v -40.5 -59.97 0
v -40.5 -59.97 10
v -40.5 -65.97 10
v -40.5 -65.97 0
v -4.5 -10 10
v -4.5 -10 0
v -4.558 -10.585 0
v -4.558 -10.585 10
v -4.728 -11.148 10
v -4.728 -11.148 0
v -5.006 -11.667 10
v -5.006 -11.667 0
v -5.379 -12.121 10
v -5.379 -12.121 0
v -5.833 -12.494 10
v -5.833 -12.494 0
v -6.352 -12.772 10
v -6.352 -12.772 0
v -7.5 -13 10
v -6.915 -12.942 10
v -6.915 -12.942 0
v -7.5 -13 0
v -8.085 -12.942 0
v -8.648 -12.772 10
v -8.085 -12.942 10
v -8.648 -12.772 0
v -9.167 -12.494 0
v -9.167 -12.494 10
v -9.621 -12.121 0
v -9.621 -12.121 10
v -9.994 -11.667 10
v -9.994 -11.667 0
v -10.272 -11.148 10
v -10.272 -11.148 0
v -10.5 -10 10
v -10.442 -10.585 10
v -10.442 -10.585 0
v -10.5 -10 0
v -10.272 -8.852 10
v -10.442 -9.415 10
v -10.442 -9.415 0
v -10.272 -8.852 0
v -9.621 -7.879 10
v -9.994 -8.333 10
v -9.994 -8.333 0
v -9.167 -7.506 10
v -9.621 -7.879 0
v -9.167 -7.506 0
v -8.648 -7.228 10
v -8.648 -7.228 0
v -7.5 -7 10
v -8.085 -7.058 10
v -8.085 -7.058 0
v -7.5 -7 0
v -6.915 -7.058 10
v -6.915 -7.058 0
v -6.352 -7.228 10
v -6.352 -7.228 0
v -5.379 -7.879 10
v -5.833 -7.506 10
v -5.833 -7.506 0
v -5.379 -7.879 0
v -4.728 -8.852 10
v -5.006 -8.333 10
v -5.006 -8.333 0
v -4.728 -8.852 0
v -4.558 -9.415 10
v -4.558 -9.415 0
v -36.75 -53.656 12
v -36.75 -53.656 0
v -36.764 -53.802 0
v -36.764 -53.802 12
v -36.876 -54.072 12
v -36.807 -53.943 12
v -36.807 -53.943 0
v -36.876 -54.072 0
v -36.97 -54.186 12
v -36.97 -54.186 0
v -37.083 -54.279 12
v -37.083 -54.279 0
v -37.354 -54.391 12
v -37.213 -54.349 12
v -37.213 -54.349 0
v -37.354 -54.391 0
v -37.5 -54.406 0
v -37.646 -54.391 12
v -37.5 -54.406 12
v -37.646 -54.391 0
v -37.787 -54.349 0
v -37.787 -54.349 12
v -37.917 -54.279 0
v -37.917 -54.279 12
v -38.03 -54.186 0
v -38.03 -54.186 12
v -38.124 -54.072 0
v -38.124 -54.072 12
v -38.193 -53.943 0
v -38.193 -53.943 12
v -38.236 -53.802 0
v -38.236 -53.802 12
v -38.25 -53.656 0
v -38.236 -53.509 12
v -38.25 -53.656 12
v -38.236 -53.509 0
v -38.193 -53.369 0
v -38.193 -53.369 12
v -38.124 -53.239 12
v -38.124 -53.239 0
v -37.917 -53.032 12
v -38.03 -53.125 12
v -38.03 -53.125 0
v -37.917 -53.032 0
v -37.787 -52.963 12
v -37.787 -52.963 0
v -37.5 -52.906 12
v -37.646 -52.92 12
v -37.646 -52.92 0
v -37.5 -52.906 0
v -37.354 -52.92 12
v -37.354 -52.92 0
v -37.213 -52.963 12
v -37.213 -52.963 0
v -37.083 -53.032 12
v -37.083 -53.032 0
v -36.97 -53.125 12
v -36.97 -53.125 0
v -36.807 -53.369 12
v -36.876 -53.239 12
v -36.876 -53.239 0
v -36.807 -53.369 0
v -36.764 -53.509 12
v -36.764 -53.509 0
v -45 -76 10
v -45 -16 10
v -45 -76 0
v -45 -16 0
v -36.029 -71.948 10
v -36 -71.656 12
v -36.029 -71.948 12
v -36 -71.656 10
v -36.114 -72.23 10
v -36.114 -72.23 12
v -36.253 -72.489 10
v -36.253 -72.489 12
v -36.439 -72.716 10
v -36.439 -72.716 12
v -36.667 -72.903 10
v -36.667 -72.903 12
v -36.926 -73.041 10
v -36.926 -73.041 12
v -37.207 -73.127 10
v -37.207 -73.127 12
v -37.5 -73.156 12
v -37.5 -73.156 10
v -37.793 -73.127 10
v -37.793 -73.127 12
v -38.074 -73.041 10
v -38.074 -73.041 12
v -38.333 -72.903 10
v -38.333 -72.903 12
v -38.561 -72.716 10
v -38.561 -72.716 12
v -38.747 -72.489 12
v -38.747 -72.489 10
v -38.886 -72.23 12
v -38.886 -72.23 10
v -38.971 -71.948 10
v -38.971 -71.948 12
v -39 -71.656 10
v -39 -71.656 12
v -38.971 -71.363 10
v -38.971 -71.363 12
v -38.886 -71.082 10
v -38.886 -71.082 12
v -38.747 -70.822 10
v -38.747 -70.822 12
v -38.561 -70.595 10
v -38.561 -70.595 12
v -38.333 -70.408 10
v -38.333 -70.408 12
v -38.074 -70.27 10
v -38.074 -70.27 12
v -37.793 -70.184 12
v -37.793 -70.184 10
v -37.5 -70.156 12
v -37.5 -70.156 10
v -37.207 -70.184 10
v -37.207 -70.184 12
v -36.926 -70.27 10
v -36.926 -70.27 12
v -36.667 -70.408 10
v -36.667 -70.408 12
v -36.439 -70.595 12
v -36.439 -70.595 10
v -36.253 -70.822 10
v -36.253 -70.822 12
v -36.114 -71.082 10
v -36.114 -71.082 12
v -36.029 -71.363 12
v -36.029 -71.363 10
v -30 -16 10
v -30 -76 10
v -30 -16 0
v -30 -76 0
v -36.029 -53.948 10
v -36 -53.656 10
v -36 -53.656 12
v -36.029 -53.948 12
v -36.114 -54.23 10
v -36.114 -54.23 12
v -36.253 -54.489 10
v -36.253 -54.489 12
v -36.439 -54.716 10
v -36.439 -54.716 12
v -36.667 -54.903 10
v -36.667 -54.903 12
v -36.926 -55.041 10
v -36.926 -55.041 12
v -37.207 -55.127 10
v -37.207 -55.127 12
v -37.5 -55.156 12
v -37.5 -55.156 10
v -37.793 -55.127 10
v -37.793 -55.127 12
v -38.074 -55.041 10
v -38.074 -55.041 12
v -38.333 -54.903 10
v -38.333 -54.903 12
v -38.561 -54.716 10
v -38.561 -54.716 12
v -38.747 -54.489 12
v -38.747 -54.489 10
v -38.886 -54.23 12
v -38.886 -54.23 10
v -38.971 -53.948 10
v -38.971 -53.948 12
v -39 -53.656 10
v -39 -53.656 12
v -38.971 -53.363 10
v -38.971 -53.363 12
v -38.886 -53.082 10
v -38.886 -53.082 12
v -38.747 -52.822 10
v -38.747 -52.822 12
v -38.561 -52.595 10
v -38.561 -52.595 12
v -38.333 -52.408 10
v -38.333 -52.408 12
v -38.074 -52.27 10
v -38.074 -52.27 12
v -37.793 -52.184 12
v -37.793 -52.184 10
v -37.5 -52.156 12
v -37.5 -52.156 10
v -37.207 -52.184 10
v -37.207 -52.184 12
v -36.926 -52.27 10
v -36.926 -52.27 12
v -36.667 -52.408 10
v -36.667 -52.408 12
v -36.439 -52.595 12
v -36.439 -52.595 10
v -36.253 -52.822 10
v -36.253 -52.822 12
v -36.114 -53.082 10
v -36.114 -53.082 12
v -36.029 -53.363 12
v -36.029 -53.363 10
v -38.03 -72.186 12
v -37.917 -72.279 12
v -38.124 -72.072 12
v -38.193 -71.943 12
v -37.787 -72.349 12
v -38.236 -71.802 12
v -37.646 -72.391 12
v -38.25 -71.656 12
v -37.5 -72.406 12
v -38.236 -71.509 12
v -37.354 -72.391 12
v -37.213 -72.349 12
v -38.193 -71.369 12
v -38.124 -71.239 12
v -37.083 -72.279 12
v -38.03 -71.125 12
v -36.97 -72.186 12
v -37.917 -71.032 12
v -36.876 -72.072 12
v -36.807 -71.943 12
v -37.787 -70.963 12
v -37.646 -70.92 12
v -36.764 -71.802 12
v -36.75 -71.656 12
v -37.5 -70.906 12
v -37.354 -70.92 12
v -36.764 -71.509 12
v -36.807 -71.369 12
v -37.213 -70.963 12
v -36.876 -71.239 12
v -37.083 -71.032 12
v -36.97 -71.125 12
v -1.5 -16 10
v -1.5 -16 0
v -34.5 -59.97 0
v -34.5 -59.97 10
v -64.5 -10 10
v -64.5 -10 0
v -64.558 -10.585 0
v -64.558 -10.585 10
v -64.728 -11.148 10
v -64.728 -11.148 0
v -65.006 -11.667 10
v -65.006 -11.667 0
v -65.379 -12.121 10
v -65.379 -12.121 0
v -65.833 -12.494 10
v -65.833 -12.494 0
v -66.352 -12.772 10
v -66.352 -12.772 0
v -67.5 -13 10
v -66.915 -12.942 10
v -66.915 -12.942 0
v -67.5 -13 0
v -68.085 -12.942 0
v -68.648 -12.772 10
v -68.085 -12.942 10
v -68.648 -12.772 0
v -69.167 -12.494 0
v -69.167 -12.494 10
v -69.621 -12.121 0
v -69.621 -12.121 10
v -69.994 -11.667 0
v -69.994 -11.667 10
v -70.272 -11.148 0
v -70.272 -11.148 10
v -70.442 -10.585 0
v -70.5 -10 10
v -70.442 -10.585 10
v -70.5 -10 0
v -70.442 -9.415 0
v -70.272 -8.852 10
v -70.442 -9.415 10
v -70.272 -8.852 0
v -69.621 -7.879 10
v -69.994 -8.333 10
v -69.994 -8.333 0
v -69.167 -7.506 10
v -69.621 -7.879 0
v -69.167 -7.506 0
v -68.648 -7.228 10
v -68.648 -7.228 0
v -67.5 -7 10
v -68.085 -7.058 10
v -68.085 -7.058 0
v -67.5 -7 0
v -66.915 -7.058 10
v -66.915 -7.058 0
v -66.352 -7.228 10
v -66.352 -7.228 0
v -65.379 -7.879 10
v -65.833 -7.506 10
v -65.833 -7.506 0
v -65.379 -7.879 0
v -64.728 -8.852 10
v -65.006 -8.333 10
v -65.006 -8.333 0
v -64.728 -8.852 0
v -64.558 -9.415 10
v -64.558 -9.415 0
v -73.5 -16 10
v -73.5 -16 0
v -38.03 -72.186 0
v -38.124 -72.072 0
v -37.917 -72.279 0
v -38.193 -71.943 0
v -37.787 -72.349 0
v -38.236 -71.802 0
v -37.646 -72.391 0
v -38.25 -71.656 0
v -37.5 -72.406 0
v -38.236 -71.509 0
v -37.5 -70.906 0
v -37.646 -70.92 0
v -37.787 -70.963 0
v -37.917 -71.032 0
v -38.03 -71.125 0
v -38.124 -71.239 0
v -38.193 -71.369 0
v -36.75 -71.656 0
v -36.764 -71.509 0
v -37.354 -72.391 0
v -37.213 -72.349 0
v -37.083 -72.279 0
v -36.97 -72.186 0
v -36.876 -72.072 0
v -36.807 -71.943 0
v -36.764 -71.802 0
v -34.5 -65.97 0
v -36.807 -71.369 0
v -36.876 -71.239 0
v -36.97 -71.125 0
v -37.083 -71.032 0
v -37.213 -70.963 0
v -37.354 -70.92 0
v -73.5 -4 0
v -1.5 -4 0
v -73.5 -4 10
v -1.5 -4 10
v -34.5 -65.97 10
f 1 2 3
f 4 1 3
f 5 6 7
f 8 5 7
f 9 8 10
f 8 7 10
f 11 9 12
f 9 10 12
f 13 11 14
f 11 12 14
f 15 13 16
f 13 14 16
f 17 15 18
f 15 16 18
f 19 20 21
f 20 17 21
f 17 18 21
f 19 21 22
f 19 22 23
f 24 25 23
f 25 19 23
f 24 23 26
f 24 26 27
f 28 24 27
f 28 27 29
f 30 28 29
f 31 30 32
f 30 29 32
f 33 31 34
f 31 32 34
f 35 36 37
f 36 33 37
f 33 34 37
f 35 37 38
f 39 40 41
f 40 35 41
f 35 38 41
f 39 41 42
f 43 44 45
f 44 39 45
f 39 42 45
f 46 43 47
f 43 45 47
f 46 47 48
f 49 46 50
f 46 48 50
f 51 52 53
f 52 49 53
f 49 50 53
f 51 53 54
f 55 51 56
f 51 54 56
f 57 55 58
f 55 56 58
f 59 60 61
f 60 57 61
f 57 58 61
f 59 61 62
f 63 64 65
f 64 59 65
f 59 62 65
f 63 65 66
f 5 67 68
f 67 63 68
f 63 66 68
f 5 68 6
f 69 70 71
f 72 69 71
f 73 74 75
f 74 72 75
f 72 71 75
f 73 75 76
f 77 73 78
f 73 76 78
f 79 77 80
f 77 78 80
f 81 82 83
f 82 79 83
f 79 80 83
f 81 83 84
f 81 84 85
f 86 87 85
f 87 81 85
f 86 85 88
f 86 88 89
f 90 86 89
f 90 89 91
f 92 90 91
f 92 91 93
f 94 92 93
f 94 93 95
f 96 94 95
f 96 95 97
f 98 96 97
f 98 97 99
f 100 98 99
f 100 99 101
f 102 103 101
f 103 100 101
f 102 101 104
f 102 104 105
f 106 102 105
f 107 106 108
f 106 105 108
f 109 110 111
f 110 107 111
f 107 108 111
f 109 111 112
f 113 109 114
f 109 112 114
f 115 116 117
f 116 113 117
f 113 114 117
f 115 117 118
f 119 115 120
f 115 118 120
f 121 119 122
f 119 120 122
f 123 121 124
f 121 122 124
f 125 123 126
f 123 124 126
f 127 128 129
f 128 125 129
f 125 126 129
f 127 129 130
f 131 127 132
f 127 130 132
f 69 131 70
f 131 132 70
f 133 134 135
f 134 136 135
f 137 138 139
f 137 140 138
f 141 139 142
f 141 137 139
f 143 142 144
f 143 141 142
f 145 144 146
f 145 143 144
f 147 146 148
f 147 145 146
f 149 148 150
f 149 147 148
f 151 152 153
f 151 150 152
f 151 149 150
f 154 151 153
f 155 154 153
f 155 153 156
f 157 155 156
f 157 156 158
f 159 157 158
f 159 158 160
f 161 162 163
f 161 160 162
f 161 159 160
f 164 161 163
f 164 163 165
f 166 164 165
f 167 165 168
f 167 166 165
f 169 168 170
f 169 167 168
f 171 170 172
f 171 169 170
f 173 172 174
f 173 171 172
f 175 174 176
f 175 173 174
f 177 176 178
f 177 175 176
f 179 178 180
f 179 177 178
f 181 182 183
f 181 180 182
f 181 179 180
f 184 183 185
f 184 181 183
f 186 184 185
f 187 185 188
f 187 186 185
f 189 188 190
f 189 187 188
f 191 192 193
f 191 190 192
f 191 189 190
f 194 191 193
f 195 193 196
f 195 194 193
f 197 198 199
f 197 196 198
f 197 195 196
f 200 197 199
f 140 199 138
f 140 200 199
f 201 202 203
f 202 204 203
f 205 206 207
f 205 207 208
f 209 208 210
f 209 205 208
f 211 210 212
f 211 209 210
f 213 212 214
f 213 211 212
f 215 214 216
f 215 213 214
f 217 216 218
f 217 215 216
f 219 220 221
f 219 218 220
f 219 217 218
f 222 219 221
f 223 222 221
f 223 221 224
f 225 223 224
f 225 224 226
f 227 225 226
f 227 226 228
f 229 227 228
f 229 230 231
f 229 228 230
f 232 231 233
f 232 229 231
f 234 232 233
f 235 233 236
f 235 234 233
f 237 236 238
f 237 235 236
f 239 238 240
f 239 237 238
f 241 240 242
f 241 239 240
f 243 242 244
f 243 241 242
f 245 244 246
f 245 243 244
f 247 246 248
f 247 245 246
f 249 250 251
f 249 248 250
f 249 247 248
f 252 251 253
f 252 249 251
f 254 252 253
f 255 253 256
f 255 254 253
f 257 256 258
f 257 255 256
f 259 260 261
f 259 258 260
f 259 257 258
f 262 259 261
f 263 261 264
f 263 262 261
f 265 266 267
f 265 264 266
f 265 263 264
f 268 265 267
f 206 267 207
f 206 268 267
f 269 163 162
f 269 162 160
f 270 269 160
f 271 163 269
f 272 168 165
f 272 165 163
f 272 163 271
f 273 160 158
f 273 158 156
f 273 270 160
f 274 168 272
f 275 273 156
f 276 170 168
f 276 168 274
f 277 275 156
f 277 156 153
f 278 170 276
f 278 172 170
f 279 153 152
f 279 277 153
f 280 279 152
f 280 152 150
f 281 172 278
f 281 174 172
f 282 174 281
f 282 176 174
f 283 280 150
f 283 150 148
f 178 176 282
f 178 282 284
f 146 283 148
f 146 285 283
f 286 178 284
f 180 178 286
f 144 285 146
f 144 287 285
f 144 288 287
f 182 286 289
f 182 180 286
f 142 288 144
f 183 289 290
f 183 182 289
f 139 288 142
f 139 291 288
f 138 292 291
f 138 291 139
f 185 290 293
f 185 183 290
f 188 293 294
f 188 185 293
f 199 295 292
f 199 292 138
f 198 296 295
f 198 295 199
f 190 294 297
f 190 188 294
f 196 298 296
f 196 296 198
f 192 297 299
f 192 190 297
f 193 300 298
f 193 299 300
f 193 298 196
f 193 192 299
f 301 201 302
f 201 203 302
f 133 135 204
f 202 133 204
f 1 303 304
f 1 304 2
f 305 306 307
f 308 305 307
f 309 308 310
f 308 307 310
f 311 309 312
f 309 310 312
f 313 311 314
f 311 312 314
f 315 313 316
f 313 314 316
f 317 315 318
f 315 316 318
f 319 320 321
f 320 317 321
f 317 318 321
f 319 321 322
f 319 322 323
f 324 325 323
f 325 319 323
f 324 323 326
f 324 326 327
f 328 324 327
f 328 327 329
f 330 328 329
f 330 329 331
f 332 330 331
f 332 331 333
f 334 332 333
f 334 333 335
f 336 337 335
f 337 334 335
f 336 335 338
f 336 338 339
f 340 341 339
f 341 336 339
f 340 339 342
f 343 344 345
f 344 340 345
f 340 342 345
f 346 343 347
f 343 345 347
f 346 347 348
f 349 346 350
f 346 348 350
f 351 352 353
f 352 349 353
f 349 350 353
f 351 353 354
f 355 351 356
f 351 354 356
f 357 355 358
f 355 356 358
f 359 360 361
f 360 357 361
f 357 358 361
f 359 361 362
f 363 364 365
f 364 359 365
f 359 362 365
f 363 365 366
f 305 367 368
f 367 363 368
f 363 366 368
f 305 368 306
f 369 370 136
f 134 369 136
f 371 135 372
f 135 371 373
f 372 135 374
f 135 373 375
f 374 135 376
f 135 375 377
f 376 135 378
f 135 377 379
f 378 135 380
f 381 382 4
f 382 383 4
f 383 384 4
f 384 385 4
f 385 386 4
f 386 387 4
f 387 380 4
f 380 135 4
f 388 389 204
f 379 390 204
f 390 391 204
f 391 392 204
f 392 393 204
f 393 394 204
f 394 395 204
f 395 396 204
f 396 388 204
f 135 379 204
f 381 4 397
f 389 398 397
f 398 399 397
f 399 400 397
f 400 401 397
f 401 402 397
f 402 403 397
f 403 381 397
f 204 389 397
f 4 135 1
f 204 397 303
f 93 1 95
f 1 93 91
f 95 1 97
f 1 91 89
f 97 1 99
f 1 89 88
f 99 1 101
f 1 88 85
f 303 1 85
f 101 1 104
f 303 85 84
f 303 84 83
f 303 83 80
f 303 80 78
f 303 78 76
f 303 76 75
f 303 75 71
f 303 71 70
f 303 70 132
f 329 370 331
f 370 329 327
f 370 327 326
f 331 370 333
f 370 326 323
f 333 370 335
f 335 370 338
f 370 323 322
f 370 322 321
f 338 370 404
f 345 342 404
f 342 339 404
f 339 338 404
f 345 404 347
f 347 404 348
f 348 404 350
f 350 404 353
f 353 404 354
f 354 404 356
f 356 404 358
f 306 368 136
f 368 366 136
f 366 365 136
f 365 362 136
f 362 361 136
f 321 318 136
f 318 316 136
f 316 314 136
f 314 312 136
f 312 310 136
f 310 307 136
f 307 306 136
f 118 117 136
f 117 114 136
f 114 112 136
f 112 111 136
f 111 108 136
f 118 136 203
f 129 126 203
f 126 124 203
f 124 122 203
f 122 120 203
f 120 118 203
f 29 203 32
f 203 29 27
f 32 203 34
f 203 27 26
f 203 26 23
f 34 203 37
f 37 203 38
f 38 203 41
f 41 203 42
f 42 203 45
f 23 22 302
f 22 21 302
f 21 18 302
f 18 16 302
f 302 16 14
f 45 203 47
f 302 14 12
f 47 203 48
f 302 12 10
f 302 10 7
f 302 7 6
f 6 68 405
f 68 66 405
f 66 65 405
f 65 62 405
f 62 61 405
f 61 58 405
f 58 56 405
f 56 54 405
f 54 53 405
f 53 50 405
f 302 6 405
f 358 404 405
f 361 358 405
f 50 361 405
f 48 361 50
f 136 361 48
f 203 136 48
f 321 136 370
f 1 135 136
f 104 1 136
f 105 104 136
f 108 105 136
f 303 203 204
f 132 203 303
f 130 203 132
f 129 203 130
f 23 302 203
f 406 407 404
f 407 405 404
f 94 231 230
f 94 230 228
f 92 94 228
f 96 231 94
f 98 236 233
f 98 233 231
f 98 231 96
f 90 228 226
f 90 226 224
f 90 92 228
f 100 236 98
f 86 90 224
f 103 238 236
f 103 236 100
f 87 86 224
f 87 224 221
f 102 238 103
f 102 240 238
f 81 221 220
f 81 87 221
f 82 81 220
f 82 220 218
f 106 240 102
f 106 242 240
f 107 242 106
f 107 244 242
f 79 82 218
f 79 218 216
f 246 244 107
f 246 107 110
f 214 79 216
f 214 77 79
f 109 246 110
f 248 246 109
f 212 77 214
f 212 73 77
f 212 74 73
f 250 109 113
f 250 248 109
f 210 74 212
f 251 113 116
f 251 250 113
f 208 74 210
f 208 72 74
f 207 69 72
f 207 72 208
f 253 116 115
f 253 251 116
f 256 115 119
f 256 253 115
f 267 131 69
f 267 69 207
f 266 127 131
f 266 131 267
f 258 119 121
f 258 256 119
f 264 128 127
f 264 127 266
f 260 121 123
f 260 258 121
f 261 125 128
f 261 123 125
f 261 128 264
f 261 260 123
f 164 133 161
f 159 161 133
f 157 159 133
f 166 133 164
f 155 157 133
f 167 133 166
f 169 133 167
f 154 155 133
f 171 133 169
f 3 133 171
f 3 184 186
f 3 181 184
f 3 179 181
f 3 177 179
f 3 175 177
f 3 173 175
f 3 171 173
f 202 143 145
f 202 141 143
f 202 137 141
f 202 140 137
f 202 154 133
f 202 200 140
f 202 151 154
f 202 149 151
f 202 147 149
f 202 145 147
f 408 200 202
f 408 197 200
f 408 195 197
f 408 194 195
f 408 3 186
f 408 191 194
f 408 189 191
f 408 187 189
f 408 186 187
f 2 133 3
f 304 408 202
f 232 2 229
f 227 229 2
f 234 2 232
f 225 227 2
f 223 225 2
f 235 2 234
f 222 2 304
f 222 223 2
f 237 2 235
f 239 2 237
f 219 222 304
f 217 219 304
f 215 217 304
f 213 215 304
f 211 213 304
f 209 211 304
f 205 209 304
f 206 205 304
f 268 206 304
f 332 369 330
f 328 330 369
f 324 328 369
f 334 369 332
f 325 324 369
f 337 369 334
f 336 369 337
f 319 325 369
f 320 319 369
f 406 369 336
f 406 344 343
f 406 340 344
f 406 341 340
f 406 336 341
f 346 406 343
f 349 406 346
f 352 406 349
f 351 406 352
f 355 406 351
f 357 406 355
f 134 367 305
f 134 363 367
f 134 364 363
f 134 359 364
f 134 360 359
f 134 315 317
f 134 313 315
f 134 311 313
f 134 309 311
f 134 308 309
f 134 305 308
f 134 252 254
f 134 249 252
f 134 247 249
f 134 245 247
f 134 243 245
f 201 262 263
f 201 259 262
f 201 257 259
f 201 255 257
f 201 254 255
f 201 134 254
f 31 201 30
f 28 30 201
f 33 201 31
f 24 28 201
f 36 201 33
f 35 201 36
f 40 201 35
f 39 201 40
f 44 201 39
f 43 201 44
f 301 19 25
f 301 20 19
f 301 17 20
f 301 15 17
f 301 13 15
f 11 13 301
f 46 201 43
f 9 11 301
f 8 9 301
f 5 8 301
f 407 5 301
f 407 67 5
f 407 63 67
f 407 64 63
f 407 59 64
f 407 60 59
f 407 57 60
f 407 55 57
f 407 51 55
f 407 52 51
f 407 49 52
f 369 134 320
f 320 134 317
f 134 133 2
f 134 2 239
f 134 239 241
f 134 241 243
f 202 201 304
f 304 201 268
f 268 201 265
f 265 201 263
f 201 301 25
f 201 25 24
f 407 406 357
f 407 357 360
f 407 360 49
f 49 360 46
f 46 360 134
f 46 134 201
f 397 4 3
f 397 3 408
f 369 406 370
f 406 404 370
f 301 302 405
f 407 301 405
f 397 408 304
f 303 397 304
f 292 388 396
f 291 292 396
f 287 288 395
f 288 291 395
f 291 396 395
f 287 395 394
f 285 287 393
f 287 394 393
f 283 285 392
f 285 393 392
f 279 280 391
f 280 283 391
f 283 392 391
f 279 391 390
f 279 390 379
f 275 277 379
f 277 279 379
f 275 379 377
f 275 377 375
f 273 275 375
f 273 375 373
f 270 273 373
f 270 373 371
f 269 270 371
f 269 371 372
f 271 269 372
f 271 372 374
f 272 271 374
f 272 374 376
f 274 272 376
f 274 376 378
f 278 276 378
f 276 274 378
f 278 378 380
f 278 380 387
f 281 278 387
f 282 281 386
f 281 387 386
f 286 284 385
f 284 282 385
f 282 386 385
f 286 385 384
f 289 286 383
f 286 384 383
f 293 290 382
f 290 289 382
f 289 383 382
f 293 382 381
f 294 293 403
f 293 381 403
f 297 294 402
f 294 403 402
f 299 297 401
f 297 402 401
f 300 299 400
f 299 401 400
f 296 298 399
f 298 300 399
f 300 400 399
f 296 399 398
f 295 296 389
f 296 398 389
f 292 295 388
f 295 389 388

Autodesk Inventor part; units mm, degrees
ref_plane "YZ Plane" through (0, 0, 0) normal (1, 0, 0) x (0, 1, 0)
ref_plane "XZ Plane" through (0, 0, 0) normal (0, 1, 0) x (-1, 0, 0)
ref_plane "XY Plane" through (0, 0, 0) normal (0, 0, 1) x (1, 0, 0)
ref_plane "Płaszczyzna konstrukcyjna1" through (0, -20, 0) normal (0, 0, 1) x (1, 0, 0)
sketch "Szkic1" plane through (0, -20, 0) normal (0, 0, 1) x (1, 0, 0)
  line L0 (-14.5, -19.3841) -> (-60.5, -19.3841) construction
  line L1 (-14.5, -66.5556) -> (-14.5, -19.3841) projected
  line L2 (-60.5, -66.5556) -> (-14.5, -66.5556) projected
  line L3 (-60.5, -19.3841) -> (-60.5, -66.5556) projected
  line L4 (-62.5, -67.9698) -> (-62.5, -17.9698) projected
  line L5 (-12.5, -67.9698) -> (-62.5, -67.9698) projected
  line L6 (-12.5, -17.9698) -> (-12.5, -67.9698) projected
  line L7 (-62.5, -17.9698) -> (-12.5, -17.9698) construction
  circle A0 centre (-7.5, 10) radius 3 projected
  circle A1 centre (-67.5, 10) radius 3 projected
  line L8 (-75, 0) -> (0, 0) construction
  line L9 (0, 20) -> (0, 0) projected
  line L10 (-75, 20) -> (0, 20) projected
  line L11 (-75, 20) -> (-75, 0) projected
  line L12 (-14.5, -19.3841) -> (-60.5, -66.5556) construction
  line L13 (-60.5, -19.3841) -> (-14.5, -66.5556) construction
  line L14 (-1.5, 16) -> (-73.5, 16)
  line L15 (-73.5, 16) -> (-73.5, 4)
  line L16 (-1.5, 4) -> (-1.5, 16)
  line L17 (-27.5, -27.9698) -> (-47.5, -27.9698) construction
  line L18 (-47.5, -27.9698) -> (-47.5, -57.9698) construction
  line L19 (-47.5, -57.9698) -> (-27.5, -57.9698) construction
  line L20 (-27.5, -57.9698) -> (-27.5, -27.9698) construction
  line L21 (-27.5, -27.9698) -> (-47.5, -57.9698) construction
  line L22 (-47.5, -27.9698) -> (-27.5, -57.9698) construction
  line L23 (-37.5, -27.9698) -> (-37.5, -57.9698) construction
  circle A2 centre (-37.5, -33.6556) radius 0.75
  circle A3 centre (-37.5, -51.6556) radius 0.75
  circle A4 centre (-37.5, -33.6556) radius 1.5
  circle A5 centre (-37.5, -51.6556) radius 1.5
  line L24 (-45, 4) -> (-45, -56)
  line L25 (-45, -56) -> (-30, -56)
  line L26 (-30, -56) -> (-30, 4)
  line L27 (-34.5, -39.9698) -> (-40.5, -39.9698)
  line L28 (-40.5, -39.9698) -> (-40.5, -45.9698)
  line L29 (-40.5, -45.9698) -> (-34.5, -45.9698)
  line L30 (-34.5, -45.9698) -> (-34.5, -39.9698)
  line L31 (-34.5, -39.9698) -> (-40.5, -45.9698) construction
  line L32 (-40.5, -39.9698) -> (-34.5, -45.9698) construction
  line L33 (-73.5, 4) -> (-45, 4)
  line L34 (-30, 4) -> (-1.5, 4)
  line L35 (-37.5, -33.6556) -> (-37.5, -51.6556) construction
  point P0 (-37.5, -42.9698)
  point P1 (-1.5, 10)
  point P2 (-37.5, 4)
  dimension "d0" = 6
  dimension "d1" = 6
  dimension "d2" = 6
  dimension "d3" = 20
  dimension "d4" = 30
  dimension "d5" = 1.5
  dimension "d6" = 18
  dimension "d7" = 3
  dimension "d8" = 3
  dimension "d9" = 6
  dimension "d10" = 6
  dimension "d11" = 15
  dimension "d12" = 60
  dimension "d13" = 4.3444
extrude "Wyciągnięcie proste1" add sketch "Szkic1" along normal blind 10 contours L16 L34 L26 L25 L24 L33 L15 L14 | A4 | A5
sketch "Szkic2" plane through (0, -20, 10) normal (0, 0, 1) x (1, 0, 0)
  circle A0 centre (-37.5, -33.6556) radius 1.5 projected
  circle A1 centre (-37.5, -51.6556) radius 1.5 projected
  circle A2 centre (-37.5, -33.6556) radius 0.75 projected
  circle A3 centre (-37.5, -51.6556) radius 0.75 projected
  point P0 (0, 20)
extrude "Wyciągnięcie proste2" add sketch "Szkic2" along normal blind 2
properties part number "camera_holder"
